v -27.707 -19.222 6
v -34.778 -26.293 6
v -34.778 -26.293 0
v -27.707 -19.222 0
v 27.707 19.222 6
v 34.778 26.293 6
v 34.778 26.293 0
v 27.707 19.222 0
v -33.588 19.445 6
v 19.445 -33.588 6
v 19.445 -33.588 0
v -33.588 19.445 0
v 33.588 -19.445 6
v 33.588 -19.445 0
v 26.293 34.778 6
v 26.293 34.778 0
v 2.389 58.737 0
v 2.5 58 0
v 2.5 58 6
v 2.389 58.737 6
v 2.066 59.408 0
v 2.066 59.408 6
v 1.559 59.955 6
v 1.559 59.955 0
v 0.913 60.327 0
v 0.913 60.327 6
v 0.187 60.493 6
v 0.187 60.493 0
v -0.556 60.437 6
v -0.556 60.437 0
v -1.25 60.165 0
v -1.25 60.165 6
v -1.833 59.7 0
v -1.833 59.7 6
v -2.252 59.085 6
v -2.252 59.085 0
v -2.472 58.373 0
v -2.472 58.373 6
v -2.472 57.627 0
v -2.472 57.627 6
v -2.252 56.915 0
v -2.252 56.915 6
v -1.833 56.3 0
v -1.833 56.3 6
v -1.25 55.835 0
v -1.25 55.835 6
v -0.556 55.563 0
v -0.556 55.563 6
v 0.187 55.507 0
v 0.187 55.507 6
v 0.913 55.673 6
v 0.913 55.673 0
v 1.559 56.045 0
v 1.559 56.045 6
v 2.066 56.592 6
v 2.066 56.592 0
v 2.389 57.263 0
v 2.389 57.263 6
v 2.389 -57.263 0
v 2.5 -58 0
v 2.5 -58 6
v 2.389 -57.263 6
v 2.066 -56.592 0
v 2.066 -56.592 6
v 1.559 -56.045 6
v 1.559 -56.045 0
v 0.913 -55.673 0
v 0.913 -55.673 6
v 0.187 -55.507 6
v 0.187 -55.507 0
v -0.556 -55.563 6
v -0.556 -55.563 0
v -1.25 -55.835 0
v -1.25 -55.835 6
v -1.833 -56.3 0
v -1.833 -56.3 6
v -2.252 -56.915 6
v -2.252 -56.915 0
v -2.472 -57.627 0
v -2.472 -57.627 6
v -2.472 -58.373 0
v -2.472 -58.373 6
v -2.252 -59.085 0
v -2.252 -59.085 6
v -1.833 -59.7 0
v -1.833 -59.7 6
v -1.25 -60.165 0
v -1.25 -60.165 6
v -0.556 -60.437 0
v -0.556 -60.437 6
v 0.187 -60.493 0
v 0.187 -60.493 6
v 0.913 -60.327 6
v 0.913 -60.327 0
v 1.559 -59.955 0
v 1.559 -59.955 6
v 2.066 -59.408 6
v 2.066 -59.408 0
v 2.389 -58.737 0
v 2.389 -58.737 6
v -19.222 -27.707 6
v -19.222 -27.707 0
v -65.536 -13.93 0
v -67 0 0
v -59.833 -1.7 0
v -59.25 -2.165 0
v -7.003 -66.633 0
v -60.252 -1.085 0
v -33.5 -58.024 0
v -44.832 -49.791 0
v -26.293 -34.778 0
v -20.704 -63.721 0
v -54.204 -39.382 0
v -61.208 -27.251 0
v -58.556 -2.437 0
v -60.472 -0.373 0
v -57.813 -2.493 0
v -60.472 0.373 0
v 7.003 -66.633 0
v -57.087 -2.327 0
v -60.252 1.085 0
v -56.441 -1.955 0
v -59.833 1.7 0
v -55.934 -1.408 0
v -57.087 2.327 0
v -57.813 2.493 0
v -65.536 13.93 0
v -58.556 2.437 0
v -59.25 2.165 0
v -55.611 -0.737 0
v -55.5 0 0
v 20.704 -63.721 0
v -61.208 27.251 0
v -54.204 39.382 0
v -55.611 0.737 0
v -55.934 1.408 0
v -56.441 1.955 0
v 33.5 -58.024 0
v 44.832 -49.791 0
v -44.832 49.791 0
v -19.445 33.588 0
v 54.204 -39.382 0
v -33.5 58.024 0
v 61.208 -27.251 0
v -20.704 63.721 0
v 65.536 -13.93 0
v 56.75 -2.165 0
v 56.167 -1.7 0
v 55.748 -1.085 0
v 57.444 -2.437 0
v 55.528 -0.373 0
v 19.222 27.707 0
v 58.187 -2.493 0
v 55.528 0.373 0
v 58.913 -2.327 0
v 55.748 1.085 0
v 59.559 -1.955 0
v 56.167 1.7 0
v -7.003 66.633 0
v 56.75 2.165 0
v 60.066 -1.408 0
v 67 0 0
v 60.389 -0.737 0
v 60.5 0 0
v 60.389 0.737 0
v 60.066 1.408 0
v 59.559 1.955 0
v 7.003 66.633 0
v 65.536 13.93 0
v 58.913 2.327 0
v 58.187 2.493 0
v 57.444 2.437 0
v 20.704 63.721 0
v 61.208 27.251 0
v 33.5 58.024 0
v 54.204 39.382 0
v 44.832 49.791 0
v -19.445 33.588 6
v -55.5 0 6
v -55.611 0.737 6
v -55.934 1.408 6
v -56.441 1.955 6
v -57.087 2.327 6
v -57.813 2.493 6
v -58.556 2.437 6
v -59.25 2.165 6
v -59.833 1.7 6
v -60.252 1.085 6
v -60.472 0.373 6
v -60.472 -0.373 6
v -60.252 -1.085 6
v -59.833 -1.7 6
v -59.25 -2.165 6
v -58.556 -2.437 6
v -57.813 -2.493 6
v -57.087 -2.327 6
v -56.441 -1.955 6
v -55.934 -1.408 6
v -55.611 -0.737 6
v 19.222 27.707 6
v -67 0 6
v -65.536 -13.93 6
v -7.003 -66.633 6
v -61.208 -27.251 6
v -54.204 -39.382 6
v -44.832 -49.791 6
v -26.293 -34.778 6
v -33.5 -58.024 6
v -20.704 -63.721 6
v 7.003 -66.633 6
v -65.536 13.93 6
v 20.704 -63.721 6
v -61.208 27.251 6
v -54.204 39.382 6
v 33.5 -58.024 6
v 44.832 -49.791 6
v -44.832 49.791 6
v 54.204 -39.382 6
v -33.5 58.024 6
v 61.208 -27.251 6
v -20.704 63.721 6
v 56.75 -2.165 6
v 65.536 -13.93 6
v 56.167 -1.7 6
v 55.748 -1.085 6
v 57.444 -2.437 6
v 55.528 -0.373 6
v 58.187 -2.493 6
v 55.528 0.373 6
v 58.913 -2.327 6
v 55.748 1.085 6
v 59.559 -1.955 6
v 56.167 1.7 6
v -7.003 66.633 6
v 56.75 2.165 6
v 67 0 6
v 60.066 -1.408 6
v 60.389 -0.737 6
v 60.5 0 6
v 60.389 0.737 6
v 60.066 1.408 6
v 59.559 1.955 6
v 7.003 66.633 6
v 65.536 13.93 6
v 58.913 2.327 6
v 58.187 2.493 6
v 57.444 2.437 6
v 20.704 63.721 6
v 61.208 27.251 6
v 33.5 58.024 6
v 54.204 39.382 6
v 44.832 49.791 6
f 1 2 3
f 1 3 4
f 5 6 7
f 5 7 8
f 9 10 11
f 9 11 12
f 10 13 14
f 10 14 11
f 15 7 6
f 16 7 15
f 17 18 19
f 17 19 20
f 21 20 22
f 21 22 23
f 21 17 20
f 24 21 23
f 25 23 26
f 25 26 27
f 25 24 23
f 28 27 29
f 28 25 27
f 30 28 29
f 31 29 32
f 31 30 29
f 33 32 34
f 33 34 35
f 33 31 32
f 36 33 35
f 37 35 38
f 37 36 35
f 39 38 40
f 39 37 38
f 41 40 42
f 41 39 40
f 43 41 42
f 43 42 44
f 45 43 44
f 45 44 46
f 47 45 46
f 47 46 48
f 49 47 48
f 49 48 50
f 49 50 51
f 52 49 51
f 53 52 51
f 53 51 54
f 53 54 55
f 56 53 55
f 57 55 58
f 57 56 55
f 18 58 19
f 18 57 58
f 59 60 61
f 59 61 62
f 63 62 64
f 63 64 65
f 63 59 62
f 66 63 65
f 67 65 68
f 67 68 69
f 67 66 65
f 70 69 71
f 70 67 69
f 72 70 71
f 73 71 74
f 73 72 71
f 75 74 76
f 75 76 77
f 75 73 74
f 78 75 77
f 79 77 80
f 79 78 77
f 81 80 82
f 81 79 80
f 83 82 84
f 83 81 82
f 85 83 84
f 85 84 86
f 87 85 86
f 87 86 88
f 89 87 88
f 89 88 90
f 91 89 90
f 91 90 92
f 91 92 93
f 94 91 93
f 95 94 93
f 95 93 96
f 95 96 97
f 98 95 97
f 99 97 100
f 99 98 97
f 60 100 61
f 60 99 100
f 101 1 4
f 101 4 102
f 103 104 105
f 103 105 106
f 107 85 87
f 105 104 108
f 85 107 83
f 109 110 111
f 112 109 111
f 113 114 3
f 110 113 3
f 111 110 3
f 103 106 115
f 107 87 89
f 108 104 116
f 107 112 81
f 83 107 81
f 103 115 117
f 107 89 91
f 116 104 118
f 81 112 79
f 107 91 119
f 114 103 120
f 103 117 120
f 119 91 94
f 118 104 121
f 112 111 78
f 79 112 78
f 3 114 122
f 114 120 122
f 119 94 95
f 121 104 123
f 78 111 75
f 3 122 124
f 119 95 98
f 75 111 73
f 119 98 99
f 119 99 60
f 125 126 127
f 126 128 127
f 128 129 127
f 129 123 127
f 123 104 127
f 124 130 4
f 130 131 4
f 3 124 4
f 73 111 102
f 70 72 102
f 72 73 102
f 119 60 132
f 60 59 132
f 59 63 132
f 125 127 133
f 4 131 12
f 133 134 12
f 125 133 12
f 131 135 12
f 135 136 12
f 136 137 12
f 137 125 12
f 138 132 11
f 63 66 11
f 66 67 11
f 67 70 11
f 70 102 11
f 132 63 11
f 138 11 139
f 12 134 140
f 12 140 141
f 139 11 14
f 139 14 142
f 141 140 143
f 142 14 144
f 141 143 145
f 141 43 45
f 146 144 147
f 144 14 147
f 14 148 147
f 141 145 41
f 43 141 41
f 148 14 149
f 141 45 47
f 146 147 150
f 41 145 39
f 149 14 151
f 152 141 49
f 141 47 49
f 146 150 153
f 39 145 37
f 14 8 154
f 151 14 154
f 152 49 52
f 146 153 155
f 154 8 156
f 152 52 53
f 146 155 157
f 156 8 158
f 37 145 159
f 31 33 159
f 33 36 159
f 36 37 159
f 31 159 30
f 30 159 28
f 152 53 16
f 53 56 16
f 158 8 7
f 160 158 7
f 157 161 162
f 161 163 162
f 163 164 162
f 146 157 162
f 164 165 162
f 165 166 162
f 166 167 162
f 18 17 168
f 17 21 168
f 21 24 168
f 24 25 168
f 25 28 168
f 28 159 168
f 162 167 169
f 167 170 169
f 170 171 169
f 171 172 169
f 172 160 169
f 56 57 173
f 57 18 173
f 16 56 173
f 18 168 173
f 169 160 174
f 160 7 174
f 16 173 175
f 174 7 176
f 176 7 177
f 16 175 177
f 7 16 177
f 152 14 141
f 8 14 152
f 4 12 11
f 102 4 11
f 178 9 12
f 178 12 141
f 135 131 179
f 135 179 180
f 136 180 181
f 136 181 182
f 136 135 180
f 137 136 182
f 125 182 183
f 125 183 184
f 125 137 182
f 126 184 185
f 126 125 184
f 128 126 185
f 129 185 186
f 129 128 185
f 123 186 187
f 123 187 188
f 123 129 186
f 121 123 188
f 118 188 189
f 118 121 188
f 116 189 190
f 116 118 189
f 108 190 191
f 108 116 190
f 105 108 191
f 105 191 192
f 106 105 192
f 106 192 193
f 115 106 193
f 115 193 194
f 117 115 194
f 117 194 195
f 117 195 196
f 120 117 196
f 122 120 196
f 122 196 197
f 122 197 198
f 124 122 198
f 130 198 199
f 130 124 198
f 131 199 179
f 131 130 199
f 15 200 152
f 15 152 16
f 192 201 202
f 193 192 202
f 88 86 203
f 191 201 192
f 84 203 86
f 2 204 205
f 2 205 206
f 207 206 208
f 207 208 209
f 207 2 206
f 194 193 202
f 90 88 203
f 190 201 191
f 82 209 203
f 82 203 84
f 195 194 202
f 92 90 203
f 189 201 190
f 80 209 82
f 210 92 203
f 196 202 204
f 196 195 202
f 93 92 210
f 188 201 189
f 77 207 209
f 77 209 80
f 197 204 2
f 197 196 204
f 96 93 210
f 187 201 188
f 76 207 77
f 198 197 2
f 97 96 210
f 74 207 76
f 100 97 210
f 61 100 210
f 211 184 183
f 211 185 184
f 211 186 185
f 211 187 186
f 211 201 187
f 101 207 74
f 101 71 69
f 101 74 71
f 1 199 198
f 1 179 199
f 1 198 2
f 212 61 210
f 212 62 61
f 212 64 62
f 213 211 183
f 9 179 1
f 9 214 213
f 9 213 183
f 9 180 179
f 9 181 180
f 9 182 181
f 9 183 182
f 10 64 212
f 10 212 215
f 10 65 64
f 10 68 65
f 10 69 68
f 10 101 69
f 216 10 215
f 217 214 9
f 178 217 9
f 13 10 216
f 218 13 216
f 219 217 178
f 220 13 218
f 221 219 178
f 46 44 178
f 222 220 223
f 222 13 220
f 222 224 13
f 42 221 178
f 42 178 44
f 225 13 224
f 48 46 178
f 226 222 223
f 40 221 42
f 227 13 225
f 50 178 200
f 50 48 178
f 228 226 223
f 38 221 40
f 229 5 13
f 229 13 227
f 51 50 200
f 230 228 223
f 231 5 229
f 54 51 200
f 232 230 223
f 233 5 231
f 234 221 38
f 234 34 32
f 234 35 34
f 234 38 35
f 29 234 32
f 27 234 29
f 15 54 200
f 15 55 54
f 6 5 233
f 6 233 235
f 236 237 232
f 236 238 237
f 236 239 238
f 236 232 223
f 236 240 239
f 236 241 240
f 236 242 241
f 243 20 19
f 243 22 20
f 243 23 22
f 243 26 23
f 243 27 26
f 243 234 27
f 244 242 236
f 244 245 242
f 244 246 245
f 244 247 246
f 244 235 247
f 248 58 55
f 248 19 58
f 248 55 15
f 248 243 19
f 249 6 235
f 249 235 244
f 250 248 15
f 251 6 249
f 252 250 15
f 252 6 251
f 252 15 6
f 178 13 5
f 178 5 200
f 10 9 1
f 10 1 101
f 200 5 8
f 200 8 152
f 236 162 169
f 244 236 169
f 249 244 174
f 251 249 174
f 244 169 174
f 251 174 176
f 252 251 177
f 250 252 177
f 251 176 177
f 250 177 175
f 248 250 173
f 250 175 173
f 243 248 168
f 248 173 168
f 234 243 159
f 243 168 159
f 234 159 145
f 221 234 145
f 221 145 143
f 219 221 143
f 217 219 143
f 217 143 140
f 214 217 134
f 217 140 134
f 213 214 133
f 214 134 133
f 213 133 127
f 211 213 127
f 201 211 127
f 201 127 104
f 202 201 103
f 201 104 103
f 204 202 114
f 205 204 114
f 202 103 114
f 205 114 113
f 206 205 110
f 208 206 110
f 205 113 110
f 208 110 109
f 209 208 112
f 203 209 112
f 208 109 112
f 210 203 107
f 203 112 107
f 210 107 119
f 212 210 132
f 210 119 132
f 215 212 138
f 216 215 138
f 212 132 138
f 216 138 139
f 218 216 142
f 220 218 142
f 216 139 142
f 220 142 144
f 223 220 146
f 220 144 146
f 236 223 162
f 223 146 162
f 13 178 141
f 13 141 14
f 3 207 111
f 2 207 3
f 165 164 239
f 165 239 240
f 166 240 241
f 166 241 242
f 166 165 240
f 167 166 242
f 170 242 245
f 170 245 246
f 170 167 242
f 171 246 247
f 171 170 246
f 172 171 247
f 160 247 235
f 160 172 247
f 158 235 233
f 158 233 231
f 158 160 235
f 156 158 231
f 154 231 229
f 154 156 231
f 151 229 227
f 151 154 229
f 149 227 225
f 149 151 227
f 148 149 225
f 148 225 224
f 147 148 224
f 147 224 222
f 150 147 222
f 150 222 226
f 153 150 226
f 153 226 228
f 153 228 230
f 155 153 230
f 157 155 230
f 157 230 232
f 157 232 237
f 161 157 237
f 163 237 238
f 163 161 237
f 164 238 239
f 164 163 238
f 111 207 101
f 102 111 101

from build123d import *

# Parameters (mm, degrees)
SKETCH1_R               = 67
SKETCH1_R_2             = 2.5
BOSS_EXTRUDE1_DEPTH     = 6
CUT_EXTRUDE3_DEPTH      = 47
CUT_EXTRUDE3_DEPTH_BACK = 25
CUT_EXTRUDE6_DEPTH      = 10
CUT_EXTRUDE7_DEPTH      = 10


with BuildPart() as part:
    # Sketch1 → Boss-Extrude1 (new body)
    with BuildSketch(Plane.XY):
        Circle(SKETCH1_R)
        with Locations((0, 58)):
            Circle(SKETCH1_R_2, mode=Mode.SUBTRACT)
        with Locations((58, 0)):
            Circle(SKETCH1_R_2, mode=Mode.SUBTRACT)
        with Locations((0, -58)):
            Circle(SKETCH1_R_2, mode=Mode.SUBTRACT)
        with Locations((-58, 0)):
            Circle(SKETCH1_R_2, mode=Mode.SUBTRACT)
    extrude(amount=BOSS_EXTRUDE1_DEPTH)

    # Sketch3 → Cut-Extrude3 (cut, two sides: drawn at the far end of the back side and taken through both)
    with BuildSketch(Plane.XY.offset(6).offset(-CUT_EXTRUDE3_DEPTH_BACK)):
        Polygon((-34.424621456, -26.646446356), (-27.353553137, -19.575379051), (-19.575378544, -27.353553644), (-26.646446863, -34.424620949), align=None)
        Polygon((19.575379051, 27.353553137), (27.353553644, 19.575378544), (34.424620949, 26.646446863), (26.646446356, 34.424621456), align=None)
    extrude(amount=CUT_EXTRUDE3_DEPTH + CUT_EXTRUDE3_DEPTH_BACK, mode=Mode.SUBTRACT)

    # Sketch4 → Cut-Extrude6 (cut)
    with BuildSketch(Plane.XY.offset(6)):
        Polygon((-19.445436483, 33.587572106), (33.587572106, -19.445436483), (19.445436483, -33.587572106), (-33.587572106, 19.445436483), align=None)
    extrude(amount=-CUT_EXTRUDE6_DEPTH, mode=Mode.SUBTRACT)

    # Sketch5 → Cut-Extrude7 (cut)
    with BuildSketch(Plane.XY.offset(6)):
        Polygon((-34.424621456, -26.646446356), (-34.778174339, -26.292893473), (-27.707106527, -19.221825661), (-27.353553137, -19.575379051), align=None)
        Polygon((-26.646446863, -34.424620949), (-26.292893473, -34.778174339), (-19.221825661, -27.707106527), (-19.575378544, -27.353553644), align=None)
        Polygon((27.707106527, 19.221825661), (27.353553644, 19.575378544), (34.424620949, 26.646446863), (34.778174339, 26.292893473), align=None)
        Polygon((26.646446356, 34.424621456), (19.575379051, 27.353553137), (19.221825661, 27.707106527), (26.292893473, 34.778174339), align=None)
    extrude(amount=-CUT_EXTRUDE7_DEPTH, mode=Mode.SUBTRACT)


solid = part.part
